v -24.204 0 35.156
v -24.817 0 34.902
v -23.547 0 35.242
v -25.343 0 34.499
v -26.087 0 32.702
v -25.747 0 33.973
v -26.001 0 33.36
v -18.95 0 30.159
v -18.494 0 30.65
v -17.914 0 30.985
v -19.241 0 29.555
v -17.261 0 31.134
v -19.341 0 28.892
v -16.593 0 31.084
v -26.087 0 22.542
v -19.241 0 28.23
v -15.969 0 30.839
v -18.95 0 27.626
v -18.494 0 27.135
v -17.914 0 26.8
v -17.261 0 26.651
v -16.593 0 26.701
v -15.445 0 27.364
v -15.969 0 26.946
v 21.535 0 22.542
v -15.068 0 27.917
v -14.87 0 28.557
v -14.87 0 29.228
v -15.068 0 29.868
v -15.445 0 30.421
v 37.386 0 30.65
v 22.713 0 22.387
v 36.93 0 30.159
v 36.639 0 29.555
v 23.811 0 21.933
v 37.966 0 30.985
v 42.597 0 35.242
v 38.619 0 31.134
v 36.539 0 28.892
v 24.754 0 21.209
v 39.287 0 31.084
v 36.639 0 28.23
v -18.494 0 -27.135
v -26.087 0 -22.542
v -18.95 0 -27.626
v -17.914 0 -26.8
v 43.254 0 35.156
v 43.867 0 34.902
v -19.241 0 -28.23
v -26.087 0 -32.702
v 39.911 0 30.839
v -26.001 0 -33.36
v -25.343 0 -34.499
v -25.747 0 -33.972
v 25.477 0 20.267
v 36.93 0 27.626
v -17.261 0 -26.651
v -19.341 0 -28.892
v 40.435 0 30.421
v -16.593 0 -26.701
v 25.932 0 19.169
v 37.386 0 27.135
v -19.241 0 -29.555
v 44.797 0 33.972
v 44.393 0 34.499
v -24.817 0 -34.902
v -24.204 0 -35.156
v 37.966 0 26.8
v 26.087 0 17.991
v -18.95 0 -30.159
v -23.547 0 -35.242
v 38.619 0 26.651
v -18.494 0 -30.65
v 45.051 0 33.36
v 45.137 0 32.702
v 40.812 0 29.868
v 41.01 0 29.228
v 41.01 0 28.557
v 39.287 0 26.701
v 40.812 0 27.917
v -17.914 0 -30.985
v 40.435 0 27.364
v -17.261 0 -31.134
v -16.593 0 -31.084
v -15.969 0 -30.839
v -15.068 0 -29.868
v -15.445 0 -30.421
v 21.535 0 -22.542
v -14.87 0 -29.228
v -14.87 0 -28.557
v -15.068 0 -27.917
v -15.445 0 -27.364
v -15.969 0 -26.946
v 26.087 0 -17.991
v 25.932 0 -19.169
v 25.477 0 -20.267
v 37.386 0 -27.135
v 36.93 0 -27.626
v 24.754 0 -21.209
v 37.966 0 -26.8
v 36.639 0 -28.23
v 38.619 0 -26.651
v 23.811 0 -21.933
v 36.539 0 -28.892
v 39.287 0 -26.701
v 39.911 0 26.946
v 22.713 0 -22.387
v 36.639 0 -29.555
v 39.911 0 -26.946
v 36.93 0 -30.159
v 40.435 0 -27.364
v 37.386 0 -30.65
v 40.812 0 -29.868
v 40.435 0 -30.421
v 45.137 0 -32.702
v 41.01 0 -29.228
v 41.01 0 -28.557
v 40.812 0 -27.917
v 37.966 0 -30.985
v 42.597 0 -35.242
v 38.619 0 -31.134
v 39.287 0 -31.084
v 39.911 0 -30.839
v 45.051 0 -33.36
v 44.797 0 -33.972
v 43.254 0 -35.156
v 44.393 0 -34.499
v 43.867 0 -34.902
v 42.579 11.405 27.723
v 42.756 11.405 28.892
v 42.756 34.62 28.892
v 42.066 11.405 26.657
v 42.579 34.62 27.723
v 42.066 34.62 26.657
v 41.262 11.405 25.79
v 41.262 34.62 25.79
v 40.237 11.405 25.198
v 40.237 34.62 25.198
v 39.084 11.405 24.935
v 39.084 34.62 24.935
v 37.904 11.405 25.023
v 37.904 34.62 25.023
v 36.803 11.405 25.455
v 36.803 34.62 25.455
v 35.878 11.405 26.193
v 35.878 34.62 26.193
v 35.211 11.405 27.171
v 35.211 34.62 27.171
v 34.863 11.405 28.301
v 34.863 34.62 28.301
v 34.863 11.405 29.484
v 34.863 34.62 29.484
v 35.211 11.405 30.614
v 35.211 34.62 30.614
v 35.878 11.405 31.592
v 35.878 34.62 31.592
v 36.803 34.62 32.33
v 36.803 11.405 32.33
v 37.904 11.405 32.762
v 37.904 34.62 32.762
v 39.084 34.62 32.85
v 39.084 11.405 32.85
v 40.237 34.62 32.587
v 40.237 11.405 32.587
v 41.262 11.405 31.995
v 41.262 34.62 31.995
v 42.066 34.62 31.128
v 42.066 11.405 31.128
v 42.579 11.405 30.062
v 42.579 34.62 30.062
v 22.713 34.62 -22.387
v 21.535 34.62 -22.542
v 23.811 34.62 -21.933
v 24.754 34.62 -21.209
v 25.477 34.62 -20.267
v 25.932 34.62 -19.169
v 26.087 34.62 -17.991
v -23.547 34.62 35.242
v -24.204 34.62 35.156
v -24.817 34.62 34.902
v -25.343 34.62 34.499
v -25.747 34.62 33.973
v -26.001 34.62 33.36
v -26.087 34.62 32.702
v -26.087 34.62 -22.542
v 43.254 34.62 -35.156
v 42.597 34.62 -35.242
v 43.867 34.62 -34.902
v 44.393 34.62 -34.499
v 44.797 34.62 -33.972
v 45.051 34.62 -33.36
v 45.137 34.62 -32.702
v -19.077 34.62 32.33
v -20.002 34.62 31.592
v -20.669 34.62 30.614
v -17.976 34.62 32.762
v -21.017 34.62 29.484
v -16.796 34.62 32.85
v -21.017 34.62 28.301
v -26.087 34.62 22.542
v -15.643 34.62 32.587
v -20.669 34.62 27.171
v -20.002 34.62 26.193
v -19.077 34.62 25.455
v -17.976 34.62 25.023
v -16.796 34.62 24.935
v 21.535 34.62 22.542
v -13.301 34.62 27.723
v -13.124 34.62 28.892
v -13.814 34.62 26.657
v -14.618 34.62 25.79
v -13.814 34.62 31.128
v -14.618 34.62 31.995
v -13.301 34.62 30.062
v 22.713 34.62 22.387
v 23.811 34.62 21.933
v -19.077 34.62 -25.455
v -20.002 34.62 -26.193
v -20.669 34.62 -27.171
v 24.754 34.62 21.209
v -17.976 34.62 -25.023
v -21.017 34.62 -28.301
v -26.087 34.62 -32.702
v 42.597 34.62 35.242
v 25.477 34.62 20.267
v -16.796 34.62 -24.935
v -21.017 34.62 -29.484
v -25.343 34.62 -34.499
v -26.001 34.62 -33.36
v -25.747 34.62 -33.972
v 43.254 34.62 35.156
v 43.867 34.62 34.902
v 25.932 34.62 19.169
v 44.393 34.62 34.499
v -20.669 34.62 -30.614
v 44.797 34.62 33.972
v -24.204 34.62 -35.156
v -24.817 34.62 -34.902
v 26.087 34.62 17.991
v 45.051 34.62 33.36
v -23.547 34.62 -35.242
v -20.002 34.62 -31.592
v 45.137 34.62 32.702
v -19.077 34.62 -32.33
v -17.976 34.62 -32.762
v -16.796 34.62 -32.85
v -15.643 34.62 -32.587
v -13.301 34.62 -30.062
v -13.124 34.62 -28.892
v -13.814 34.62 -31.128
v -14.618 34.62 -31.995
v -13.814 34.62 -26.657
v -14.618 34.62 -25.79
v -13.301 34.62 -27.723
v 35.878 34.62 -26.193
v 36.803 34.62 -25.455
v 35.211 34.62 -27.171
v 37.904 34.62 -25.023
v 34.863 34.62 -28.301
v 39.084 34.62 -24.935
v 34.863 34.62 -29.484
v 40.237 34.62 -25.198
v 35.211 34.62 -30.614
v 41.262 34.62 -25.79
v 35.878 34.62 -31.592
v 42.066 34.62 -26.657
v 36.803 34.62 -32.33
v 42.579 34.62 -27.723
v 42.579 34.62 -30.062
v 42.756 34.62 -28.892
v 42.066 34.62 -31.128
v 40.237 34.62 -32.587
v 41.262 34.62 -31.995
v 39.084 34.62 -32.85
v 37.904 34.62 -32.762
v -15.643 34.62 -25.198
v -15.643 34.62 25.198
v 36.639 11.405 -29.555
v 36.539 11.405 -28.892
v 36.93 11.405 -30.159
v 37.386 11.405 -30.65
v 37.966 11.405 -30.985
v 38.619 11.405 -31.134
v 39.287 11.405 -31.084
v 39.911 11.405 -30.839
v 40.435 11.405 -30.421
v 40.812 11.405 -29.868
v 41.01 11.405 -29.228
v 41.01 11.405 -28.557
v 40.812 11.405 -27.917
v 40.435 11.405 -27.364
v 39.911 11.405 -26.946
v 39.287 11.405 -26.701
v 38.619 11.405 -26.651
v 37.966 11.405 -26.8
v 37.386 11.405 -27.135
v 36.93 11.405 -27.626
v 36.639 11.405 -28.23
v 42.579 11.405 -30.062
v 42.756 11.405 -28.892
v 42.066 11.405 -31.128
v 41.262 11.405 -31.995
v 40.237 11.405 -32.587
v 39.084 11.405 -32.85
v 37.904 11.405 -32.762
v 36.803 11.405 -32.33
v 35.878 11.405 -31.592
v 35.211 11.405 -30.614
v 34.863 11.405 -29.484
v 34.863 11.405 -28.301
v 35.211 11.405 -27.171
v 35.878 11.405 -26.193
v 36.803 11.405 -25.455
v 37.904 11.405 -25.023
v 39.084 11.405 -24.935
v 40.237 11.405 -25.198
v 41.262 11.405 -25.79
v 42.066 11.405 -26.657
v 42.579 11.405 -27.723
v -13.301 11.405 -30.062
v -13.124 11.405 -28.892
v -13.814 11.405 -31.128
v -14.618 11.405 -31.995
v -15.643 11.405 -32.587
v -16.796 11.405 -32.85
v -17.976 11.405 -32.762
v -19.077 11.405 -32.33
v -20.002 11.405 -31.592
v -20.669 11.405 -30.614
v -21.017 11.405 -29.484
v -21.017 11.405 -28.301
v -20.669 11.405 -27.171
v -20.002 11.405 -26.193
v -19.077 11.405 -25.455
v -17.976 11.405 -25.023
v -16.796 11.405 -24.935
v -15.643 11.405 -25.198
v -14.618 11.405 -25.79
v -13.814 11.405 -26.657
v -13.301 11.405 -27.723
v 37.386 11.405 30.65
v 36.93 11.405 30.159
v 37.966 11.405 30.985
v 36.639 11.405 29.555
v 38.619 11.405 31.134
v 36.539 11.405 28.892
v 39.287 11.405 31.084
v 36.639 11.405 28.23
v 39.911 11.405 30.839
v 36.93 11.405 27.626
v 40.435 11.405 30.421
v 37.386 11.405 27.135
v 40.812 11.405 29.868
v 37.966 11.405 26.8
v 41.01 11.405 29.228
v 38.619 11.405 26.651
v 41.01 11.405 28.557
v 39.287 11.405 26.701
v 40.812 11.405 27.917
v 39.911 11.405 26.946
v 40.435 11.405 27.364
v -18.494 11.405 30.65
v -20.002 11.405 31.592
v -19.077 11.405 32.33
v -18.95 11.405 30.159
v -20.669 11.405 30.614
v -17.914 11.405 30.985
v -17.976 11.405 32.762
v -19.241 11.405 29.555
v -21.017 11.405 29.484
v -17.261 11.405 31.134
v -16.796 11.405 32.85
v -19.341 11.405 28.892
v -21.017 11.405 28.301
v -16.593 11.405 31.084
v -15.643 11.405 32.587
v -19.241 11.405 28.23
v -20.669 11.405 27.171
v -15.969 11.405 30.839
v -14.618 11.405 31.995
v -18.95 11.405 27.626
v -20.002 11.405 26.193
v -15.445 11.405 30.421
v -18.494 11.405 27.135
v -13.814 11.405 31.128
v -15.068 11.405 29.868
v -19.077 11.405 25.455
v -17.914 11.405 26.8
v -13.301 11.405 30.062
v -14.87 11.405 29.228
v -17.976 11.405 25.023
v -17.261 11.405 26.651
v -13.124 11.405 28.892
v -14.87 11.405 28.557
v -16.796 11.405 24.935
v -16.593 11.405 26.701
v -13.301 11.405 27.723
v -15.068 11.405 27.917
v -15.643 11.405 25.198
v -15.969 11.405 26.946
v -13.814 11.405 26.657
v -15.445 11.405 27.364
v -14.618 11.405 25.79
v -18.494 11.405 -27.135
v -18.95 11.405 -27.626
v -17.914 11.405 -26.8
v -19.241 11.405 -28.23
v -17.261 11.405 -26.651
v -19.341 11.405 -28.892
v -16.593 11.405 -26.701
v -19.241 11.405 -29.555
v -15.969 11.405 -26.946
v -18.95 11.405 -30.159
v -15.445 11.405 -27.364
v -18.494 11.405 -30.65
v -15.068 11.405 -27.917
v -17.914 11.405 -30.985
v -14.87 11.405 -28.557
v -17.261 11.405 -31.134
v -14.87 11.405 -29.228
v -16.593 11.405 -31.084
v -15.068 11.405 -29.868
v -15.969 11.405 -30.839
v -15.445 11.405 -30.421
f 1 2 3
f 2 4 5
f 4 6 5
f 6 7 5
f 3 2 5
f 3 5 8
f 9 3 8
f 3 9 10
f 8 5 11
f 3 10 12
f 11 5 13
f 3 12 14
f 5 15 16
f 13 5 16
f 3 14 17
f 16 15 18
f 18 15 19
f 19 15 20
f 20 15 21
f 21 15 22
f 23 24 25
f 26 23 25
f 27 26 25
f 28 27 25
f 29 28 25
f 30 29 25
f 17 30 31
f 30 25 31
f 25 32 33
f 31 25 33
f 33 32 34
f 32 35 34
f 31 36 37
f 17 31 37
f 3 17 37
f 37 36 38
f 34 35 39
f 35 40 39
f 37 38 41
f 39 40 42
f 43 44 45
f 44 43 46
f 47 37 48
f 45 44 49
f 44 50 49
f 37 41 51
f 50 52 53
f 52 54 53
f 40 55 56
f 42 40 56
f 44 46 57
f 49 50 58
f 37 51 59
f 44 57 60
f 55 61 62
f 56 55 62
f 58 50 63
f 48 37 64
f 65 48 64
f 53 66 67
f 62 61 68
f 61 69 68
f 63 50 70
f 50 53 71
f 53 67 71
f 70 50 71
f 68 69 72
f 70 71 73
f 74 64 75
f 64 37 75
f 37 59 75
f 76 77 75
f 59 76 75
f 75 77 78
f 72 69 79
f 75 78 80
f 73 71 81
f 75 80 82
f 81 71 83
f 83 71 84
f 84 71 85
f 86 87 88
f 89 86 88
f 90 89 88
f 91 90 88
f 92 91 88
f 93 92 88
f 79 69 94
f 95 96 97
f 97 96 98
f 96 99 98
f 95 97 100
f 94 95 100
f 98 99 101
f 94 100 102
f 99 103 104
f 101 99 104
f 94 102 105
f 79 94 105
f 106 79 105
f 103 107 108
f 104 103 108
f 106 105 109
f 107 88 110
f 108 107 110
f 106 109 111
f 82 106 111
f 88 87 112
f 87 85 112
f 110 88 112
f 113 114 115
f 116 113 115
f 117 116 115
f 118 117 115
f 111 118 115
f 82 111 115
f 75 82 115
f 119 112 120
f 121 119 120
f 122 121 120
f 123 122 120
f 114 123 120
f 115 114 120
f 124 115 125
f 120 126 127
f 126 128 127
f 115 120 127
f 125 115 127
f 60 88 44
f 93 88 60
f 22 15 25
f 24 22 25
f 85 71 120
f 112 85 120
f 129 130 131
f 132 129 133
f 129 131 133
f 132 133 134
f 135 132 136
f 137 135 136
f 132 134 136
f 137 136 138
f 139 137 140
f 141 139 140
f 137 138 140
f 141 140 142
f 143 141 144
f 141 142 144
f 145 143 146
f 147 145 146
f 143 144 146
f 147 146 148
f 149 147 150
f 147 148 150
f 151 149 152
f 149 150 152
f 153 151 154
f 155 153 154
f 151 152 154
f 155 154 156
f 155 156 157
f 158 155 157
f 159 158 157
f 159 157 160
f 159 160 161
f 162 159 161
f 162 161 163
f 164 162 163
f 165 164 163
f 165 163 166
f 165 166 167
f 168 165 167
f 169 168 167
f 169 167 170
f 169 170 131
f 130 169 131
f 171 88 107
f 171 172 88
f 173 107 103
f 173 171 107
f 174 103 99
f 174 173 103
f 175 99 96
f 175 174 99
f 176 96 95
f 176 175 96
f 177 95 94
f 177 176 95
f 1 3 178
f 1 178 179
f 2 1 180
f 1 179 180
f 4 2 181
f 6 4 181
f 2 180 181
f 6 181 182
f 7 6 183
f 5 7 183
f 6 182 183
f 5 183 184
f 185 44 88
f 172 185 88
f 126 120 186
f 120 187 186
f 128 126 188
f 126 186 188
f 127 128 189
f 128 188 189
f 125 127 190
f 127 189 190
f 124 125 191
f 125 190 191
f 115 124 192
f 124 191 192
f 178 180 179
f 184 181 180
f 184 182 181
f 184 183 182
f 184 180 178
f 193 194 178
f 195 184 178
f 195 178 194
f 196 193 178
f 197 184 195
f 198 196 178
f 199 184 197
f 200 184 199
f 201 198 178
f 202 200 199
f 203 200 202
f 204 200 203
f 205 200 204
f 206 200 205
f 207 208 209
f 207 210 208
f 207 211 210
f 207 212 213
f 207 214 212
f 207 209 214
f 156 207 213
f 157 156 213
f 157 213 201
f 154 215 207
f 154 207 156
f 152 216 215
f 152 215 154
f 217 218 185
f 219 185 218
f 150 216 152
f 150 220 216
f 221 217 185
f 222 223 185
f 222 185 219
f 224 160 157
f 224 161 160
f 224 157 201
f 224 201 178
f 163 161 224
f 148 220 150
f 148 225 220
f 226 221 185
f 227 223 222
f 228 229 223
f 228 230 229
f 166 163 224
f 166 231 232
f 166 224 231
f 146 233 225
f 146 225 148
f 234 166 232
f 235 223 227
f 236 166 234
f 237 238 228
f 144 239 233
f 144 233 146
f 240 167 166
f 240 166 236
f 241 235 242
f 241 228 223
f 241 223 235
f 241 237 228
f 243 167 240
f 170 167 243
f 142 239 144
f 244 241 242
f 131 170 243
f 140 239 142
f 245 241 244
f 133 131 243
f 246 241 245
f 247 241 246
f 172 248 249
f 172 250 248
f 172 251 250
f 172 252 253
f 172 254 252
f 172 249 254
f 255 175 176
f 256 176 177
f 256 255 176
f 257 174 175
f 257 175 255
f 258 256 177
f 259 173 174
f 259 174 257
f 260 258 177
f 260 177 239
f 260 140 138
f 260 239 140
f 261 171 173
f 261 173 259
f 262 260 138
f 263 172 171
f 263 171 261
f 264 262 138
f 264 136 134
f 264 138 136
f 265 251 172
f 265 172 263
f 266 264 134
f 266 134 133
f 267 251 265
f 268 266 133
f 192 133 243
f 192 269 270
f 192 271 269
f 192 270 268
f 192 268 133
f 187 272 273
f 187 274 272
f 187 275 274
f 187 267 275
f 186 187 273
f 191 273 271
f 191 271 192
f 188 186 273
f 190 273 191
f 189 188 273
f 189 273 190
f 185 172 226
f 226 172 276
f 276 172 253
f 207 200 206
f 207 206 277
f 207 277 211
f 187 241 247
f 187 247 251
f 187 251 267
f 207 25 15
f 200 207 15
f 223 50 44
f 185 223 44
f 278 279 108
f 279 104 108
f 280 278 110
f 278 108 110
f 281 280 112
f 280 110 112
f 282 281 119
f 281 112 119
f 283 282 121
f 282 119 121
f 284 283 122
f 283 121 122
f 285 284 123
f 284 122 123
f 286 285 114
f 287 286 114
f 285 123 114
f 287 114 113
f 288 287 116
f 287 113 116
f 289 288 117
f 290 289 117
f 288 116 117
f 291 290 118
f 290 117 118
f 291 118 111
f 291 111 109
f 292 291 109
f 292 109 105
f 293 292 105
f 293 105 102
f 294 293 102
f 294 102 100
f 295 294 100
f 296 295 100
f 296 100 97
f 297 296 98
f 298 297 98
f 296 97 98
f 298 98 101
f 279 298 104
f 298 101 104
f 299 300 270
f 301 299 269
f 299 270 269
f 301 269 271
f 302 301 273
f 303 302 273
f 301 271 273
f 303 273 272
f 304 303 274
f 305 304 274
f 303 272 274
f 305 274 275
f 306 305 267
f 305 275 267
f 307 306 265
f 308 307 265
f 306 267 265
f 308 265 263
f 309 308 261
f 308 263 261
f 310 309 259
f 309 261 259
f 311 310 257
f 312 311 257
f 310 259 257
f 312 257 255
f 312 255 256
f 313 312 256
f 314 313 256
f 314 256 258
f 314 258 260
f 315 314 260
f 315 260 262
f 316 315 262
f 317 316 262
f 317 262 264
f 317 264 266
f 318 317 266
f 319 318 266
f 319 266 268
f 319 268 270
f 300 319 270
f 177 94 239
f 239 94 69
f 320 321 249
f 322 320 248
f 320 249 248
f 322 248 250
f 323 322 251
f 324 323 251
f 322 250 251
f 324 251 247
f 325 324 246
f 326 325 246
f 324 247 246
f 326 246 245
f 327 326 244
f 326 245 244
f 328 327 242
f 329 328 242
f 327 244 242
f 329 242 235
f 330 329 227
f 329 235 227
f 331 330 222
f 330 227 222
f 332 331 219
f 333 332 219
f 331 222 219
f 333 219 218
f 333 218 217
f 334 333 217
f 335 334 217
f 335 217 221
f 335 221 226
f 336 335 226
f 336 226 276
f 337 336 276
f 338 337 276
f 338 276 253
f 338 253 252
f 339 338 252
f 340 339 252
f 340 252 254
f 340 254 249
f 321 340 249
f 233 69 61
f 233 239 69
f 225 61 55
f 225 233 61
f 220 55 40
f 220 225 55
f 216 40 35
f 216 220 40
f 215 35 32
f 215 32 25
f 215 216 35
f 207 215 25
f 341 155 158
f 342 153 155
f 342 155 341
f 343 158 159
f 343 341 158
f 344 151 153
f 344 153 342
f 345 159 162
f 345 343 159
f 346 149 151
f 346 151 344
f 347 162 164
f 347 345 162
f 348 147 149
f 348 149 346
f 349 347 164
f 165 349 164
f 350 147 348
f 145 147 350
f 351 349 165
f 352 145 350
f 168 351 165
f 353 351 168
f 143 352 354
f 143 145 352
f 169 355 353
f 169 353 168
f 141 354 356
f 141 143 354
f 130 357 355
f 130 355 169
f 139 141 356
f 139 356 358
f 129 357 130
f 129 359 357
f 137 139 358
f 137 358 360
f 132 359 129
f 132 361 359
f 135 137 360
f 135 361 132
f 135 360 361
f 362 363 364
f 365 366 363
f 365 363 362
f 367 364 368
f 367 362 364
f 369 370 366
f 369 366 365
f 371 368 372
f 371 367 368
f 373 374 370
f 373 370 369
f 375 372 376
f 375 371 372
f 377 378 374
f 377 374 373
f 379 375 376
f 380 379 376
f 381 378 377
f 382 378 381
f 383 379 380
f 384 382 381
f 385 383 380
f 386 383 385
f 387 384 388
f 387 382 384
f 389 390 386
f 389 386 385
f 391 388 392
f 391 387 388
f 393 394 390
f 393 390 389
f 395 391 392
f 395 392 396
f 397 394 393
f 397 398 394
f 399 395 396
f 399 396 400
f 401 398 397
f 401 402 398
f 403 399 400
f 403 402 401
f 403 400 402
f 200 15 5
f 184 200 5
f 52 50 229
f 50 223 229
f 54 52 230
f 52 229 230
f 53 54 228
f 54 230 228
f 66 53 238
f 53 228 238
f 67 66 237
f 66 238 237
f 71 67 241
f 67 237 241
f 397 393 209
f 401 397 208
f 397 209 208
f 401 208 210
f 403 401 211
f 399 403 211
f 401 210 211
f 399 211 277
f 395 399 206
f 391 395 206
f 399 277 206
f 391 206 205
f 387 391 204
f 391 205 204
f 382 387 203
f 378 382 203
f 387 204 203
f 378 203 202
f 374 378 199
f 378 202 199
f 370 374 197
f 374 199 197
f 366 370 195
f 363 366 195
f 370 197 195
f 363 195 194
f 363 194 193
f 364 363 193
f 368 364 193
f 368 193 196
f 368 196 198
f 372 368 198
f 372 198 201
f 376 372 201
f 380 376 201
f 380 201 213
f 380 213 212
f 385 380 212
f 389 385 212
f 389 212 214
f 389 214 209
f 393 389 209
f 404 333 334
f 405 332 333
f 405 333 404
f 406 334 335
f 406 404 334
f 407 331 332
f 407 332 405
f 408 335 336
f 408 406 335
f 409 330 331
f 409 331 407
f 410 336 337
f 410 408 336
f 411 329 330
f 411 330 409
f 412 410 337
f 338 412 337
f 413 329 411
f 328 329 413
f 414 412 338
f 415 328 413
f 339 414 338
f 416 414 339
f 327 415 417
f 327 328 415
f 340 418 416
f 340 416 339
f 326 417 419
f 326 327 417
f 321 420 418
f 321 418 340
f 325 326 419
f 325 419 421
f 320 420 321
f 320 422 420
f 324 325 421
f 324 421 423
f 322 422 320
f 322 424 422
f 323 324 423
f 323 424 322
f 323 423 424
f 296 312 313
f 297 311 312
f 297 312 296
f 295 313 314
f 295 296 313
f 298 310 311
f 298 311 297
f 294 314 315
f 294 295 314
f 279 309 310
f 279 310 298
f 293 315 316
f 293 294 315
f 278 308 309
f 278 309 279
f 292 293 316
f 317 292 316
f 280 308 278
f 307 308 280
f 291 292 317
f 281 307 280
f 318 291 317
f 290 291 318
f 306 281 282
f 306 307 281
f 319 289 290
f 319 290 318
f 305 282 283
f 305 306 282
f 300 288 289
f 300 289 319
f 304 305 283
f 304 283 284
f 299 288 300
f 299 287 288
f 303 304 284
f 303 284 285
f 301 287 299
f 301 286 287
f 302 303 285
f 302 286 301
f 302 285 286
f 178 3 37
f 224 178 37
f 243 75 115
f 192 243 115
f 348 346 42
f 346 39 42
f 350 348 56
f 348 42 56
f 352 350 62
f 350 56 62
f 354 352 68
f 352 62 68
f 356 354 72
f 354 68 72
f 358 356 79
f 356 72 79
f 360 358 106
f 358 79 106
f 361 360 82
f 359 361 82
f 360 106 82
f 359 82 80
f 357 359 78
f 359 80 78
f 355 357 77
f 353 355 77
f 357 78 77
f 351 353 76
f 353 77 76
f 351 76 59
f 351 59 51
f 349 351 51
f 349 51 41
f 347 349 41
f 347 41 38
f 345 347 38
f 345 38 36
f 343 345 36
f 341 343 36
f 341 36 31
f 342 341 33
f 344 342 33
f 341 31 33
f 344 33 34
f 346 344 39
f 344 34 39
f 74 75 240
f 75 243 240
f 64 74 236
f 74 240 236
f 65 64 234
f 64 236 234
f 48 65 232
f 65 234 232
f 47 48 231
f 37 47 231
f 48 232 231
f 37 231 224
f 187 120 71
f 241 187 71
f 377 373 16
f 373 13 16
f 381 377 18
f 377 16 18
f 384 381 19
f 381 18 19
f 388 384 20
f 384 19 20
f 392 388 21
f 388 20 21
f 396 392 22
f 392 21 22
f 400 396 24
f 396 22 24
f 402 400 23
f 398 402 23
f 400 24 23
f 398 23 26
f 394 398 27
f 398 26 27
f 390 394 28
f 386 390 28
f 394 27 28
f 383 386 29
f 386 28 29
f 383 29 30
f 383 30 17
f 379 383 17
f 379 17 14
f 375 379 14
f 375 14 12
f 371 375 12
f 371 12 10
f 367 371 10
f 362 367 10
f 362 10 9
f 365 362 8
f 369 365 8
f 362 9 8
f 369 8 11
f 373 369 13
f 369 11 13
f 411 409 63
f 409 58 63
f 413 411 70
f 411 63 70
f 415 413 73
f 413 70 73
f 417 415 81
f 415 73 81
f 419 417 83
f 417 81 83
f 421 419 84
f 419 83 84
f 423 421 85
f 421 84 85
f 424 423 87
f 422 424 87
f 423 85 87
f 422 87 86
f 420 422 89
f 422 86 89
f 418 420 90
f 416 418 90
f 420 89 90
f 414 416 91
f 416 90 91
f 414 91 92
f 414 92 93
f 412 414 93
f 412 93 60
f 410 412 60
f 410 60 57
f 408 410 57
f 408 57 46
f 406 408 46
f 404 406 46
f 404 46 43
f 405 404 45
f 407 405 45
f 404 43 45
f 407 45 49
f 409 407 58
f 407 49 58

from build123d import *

# Parameters (mm, degrees)
BOSS_EXTRUDE2_DEPTH                            = 34.6202
CBORE_FOR_8_SOCKET_HEAD_CAP_SCREW2_D           = 4.4958
CBORE_FOR_8_SOCKET_HEAD_CAP_SCREW2_CBORE_D     = 7.9375
CBORE_FOR_8_SOCKET_HEAD_CAP_SCREW2_CBORE_DEPTH = 23.2156
FILLET2_R                                      = 4.55168
FILLET3_R                                      = 2.54


with BuildPart() as part:
    # Sketch1 → Boss-Extrude2 (new body)
    with BuildSketch(Plane(origin=(0, 0, 0), x_dir=(1, 0, 0), z_dir=(0, 1, 0))):
        Polygon((45.13707, 35.2425), (-26.08707, 35.2425), (-26.08707, 22.5425), (26.08707, 22.5425), (26.08707, -22.5425), (-26.08707, -22.5425), (-26.08707, -35.2425), (45.13707, -35.2425), align=None)
    extrude(amount=BOSS_EXTRUDE2_DEPTH)

    # CBORE for #8 Socket Head Cap Screw2 (through all)
    with Locations(Plane(origin=(0, 34.6202, 0), x_dir=(1, 0, 0), z_dir=(0, 1, 0))):
        with Locations((-72.97293, 28.8925), (38.78707, 28.8925), (38.78707, -28.8925), (-72.97293, -28.8925), (-17.09293, 28.8925), (-17.09293, -28.8925)):
            CounterBoreHole(CBORE_FOR_8_SOCKET_HEAD_CAP_SCREW2_D / 2, CBORE_FOR_8_SOCKET_HEAD_CAP_SCREW2_CBORE_D / 2, CBORE_FOR_8_SOCKET_HEAD_CAP_SCREW2_CBORE_DEPTH)

    # Fillet2
    fillet2_edges = [part.edges().sort_by_distance(p)[0] for p in [
        (26.08707, 17.3101, 22.5425),
        (26.08707, 17.3101, -22.5425),
    ]]
    fillet(fillet2_edges, radius=FILLET2_R)

    # Fillet3
    fillet3_edges = [part.edges().sort_by_distance(p)[0] for p in [
        (45.13707, 17.3101, -35.2425),
        (45.13707, 17.3101, 35.2425),
        (-26.08707, 17.3101, 35.2425),
        (-26.08707, 17.3101, -35.2425),
    ]]
    fillet(fillet3_edges, radius=FILLET3_R)


solid = part.part
